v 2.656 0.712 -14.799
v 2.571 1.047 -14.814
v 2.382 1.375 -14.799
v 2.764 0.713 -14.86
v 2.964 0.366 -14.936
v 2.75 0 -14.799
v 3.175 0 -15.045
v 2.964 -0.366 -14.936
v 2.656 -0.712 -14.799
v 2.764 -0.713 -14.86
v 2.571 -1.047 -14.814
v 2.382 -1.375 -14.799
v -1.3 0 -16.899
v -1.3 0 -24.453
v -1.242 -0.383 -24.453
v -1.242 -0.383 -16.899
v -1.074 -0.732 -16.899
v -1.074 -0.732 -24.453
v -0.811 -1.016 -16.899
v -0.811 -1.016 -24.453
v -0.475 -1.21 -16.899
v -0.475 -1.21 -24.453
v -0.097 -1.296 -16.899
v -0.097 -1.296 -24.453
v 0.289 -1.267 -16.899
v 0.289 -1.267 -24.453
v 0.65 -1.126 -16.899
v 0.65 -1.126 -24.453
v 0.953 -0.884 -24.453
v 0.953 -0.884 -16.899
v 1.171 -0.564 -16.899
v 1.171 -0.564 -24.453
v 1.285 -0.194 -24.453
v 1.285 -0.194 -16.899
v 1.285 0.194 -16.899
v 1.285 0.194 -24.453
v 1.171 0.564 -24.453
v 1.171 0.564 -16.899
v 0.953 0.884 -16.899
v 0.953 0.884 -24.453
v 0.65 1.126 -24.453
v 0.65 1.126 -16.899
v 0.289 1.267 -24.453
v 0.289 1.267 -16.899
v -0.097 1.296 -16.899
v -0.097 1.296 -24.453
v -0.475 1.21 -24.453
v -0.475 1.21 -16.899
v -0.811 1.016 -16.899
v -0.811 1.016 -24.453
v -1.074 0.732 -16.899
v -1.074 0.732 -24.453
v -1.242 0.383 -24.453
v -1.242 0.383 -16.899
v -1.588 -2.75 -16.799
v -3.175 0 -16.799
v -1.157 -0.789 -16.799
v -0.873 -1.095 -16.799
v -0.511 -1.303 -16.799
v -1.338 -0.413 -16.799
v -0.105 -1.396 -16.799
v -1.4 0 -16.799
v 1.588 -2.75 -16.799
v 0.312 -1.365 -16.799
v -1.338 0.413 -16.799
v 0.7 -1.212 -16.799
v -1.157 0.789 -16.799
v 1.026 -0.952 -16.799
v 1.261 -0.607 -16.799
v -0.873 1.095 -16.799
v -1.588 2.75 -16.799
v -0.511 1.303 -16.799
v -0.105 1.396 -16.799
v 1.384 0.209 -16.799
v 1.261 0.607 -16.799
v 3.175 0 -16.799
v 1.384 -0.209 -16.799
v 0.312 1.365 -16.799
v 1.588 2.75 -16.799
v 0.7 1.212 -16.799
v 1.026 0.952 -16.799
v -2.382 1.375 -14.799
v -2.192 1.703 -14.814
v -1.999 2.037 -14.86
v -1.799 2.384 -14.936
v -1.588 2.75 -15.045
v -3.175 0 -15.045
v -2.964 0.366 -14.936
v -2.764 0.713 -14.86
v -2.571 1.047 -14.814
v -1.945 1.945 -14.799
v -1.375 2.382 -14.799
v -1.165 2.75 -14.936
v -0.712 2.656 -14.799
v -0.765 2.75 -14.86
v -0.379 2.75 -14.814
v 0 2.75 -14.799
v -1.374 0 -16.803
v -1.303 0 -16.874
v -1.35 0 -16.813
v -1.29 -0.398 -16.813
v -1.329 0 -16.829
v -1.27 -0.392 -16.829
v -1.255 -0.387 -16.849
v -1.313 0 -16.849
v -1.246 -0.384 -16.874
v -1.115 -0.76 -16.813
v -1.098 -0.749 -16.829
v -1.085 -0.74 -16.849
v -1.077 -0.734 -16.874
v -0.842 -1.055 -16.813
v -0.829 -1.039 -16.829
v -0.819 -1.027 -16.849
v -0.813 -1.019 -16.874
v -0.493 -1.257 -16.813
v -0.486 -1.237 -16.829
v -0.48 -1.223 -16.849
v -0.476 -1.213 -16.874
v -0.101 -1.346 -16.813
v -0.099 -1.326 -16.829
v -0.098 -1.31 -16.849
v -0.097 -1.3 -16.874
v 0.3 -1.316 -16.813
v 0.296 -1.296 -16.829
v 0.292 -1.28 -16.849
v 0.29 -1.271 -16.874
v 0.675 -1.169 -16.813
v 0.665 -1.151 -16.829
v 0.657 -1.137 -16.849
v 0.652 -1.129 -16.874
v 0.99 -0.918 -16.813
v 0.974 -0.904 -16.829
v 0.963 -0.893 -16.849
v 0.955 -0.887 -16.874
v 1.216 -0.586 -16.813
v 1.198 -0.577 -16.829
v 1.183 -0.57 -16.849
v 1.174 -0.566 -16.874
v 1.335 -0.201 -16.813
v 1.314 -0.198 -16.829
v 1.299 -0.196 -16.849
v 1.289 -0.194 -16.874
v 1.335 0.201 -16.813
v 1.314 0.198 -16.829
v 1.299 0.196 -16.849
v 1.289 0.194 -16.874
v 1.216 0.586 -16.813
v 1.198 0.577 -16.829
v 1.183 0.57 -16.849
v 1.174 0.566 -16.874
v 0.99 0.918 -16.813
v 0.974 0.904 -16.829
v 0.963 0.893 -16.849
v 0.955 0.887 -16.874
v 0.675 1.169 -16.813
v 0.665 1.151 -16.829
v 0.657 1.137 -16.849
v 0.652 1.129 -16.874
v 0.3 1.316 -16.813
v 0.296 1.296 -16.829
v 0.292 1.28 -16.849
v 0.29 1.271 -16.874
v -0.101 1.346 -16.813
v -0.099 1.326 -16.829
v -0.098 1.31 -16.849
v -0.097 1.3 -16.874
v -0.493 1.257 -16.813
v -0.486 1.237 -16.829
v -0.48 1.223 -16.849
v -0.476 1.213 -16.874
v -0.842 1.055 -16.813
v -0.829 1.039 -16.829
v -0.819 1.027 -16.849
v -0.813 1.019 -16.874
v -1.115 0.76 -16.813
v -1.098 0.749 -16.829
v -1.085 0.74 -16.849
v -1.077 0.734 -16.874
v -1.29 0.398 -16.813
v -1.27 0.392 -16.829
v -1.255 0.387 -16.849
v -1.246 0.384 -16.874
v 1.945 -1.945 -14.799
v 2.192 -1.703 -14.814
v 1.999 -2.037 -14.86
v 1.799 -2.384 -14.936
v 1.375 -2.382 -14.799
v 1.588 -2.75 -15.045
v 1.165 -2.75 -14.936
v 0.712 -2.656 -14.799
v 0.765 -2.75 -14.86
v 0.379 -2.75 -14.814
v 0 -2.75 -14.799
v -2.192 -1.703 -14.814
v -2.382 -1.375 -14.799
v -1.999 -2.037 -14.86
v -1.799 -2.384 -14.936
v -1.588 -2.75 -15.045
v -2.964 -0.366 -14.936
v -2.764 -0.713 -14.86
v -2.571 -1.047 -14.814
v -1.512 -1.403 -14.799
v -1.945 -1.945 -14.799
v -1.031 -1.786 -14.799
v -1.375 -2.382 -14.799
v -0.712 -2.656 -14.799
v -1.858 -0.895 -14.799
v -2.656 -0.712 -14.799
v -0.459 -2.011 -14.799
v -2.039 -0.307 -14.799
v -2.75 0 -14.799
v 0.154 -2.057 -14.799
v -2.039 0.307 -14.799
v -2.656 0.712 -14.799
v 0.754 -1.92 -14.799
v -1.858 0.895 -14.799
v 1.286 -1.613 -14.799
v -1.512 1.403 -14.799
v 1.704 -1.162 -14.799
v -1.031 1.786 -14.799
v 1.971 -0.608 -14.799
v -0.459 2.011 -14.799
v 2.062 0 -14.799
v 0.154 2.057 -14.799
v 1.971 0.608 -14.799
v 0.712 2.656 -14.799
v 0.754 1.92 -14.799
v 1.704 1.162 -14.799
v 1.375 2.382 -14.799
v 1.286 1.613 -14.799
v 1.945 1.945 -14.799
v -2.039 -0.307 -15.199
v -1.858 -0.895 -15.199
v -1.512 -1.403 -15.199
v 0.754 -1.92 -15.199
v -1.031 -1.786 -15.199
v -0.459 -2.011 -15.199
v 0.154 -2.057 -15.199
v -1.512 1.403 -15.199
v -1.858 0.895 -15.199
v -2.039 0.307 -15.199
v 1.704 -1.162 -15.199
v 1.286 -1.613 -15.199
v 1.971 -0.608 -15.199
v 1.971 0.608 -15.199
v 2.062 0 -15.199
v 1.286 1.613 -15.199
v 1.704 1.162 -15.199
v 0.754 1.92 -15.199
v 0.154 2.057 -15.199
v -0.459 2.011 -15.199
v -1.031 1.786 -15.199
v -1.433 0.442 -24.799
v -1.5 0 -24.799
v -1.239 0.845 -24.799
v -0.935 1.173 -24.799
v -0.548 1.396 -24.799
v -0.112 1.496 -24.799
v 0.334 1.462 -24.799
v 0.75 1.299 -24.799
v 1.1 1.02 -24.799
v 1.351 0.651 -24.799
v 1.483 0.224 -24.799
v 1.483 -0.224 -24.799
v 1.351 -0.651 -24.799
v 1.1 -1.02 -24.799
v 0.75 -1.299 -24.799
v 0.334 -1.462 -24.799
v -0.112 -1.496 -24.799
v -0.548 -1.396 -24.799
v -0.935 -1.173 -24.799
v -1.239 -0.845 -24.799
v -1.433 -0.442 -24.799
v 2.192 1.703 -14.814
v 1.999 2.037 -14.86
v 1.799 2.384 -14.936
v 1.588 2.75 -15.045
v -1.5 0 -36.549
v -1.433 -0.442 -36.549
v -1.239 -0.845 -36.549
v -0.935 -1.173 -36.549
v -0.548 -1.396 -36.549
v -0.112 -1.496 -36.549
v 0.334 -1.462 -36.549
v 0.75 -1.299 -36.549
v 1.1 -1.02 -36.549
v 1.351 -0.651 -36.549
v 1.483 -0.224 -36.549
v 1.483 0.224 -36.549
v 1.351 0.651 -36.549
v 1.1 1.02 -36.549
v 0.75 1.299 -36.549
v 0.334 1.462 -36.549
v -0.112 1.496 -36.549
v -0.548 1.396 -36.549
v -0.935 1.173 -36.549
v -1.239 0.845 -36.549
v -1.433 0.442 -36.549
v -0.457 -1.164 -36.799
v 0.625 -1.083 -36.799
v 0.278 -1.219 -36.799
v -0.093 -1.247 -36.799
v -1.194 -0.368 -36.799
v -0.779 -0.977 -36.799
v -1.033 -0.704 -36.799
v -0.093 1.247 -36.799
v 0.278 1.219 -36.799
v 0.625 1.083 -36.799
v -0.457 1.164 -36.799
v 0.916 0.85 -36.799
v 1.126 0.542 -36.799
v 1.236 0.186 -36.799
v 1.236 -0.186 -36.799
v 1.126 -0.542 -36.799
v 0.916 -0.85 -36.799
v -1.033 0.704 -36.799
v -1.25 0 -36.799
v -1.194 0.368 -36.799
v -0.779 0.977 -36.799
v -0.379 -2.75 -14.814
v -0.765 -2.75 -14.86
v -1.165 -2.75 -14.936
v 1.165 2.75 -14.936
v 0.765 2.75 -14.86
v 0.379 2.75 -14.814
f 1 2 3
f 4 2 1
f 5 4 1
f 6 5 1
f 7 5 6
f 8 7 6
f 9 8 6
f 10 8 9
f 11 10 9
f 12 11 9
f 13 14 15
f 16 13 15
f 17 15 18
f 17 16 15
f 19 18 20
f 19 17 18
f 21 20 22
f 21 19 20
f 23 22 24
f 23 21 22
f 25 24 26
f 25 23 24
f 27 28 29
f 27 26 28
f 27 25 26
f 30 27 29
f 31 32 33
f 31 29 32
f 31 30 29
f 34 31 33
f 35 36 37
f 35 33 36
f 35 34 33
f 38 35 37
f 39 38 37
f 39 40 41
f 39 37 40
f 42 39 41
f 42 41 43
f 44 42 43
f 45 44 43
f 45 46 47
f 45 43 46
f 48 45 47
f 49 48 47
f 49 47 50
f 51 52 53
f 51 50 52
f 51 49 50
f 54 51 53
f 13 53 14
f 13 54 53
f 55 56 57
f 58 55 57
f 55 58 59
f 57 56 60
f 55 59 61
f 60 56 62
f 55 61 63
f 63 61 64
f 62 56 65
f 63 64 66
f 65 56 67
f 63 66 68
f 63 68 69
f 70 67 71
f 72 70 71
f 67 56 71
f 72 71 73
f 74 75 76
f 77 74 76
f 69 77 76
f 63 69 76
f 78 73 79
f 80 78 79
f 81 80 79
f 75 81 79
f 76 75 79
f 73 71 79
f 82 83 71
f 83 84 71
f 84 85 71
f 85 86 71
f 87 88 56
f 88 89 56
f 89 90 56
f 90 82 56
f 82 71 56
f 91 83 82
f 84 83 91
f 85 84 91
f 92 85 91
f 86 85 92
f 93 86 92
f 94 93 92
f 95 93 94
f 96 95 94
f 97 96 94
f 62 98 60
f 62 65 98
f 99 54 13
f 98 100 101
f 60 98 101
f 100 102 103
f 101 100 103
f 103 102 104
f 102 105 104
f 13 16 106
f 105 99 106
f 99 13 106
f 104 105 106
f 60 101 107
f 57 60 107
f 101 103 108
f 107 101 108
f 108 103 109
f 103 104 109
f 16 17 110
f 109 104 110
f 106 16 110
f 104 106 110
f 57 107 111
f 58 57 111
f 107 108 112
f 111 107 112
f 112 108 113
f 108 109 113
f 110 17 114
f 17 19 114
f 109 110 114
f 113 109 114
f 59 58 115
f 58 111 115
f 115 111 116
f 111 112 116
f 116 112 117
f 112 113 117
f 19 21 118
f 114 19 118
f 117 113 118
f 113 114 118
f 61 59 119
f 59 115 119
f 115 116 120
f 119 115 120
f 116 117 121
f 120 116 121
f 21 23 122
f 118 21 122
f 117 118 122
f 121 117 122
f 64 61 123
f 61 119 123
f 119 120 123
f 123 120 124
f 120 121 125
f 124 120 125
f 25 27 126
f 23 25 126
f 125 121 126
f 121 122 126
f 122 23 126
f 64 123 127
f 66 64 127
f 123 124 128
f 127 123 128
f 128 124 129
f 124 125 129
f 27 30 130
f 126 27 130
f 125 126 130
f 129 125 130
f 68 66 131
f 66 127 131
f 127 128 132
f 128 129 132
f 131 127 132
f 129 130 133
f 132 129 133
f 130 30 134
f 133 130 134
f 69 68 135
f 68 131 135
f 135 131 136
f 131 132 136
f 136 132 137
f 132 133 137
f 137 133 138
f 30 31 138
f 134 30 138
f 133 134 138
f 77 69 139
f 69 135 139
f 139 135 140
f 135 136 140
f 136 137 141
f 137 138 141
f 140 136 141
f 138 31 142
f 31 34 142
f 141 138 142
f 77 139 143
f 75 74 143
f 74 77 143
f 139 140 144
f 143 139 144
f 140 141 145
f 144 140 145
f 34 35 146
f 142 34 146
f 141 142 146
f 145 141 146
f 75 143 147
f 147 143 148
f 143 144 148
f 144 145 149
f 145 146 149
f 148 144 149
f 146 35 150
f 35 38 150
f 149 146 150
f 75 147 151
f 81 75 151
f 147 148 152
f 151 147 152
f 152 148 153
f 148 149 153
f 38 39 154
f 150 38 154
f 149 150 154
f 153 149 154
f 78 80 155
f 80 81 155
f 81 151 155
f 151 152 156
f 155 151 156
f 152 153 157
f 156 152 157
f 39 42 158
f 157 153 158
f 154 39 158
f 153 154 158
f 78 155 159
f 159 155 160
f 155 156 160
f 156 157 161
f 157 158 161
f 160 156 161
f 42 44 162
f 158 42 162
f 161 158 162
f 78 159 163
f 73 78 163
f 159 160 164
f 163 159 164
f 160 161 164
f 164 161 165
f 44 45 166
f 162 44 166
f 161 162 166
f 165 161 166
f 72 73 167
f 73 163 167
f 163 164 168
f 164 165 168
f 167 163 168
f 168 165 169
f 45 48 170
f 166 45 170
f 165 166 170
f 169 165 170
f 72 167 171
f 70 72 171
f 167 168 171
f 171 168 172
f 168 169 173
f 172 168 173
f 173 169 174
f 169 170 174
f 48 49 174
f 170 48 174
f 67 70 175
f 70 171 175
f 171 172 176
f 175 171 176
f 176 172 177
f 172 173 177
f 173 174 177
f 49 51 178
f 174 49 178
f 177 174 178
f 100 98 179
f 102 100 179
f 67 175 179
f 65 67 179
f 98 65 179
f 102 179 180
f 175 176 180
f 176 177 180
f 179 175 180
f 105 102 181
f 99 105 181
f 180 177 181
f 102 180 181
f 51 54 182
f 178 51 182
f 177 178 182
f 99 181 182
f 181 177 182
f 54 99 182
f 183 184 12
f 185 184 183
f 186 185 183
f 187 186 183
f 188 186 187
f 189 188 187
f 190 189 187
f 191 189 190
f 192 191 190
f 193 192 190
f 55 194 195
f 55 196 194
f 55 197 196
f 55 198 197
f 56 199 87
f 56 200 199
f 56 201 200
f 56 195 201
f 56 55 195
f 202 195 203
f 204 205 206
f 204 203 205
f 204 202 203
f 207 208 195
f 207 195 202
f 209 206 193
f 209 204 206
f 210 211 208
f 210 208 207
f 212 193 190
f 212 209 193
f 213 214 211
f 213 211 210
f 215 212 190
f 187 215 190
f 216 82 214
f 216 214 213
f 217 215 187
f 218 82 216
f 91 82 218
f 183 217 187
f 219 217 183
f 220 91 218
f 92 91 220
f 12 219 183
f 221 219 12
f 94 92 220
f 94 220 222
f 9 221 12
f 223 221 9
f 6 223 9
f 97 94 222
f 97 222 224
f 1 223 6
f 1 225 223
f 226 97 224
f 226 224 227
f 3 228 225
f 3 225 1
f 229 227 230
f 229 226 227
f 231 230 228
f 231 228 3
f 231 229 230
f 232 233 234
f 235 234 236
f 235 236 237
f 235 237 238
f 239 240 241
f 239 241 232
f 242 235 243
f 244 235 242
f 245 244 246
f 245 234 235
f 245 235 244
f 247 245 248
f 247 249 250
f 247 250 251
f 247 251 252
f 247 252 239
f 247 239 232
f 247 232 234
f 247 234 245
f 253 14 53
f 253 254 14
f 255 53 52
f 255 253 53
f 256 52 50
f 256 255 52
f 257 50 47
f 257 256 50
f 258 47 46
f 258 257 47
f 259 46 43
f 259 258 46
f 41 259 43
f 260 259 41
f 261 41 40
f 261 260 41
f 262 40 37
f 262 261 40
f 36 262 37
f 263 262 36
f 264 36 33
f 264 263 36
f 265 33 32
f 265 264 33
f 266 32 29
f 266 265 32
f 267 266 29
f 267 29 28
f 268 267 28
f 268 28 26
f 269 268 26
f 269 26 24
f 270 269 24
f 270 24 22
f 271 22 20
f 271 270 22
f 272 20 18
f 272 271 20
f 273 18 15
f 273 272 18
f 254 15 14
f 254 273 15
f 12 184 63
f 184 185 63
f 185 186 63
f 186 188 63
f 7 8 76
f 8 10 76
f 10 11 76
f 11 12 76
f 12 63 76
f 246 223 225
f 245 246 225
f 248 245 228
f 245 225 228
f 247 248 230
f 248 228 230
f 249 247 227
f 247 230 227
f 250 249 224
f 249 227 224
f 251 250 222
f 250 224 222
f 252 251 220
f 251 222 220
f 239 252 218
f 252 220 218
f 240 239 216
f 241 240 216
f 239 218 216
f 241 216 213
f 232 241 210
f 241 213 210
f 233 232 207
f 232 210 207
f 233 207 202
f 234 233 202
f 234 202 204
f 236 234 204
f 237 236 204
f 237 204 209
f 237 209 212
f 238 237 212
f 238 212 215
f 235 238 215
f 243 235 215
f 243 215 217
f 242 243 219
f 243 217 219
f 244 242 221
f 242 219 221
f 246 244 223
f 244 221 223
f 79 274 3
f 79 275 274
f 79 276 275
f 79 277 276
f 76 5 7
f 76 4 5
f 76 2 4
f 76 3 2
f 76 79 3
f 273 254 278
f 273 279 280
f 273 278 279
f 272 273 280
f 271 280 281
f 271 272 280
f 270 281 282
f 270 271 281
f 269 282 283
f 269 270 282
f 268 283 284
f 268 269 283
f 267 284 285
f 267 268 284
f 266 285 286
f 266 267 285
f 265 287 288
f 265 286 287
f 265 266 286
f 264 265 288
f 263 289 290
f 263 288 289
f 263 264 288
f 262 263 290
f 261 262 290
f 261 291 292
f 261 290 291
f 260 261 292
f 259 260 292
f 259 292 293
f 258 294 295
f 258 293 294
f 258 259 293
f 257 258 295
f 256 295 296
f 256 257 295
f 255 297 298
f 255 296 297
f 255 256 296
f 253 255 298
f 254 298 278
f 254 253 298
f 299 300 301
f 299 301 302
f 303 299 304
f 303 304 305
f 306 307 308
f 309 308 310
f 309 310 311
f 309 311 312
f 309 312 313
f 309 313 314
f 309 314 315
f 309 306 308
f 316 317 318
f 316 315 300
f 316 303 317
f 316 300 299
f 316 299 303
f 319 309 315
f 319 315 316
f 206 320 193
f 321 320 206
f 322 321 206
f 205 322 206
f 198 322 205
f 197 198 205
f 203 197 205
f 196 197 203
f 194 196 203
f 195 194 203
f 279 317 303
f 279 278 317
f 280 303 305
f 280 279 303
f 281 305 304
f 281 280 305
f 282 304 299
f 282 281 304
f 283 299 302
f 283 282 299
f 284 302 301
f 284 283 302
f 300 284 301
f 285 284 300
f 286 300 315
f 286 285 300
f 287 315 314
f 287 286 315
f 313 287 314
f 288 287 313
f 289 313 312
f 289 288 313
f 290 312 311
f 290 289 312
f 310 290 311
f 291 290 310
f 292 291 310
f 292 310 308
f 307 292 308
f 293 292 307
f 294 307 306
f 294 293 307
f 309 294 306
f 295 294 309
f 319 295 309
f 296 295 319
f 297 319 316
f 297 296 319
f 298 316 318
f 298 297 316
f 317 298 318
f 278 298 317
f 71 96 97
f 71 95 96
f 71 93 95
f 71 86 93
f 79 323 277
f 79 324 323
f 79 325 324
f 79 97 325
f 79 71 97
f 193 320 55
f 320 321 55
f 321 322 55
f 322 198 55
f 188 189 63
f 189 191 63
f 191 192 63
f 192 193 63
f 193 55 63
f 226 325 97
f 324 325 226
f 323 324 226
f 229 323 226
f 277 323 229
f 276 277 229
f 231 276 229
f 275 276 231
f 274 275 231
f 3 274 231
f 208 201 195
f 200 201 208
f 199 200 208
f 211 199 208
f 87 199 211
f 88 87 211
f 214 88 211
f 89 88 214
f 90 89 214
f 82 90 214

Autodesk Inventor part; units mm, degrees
ref_plane "YZ Plane" through (0, 0, 0) normal (1, 0, 0) x (0, 1, 0)
sketch "Skizze2" plane through (0, 0, 0) normal (0, 1, 0) x (-1, 0, 0)
  line L0 (0, -16.7994) -> (0, -36.7994)
  line L1 (0, -36.7994) -> (1.25, -36.7994)
  line L2 (1.5, -36.5494) -> (1.5, -24.7994)
  line L3 (1.5, -24.7994) -> (1.3, -24.453)
  line L4 (1.3, -24.453) -> (1.3, -16.7994)
  line L5 (1.3, -16.7994) -> (0, -16.7994)
  line L6 (1.25, -36.7994) -> (1.5, -36.5494)
  line L7 (1.5, -36.7994) -> (1.5, -37.153)
  line L8 (0, -41.2237) -> (0, -12.7287) projected
  dimension "Ds" = 2.6
  dimension "NND" = 3
  dimension "b" = 12
  dimension "d3" = 30
  dimension "d5" = 45
  dimension "PTC" = 0.5
  dimension "NLG" = 20
revolve "Drehung1" add sketch "Skizze2" angle 360 about axis through (0, 0, -16.7994) along (0, 0, -1)
sketch "Skizze3" plane through (0, 0, -16.7994) normal (0, 0, 1) x (1, 0, 0)
  circle A0 centre (0, 0) radius 1.3 projected
  line L0 (0, 2.75) -> (1.5877, 2.75)
  line L1 (1.5877, 2.75) -> (3.1754, 0)
  line L2 (3.1754, 0) -> (0, 0)
  line L3 (0, 0) -> (0, 2.75)
  line L4 (0, 2.75) -> (-1.5877, 2.75)
  line L5 (-1.5877, 2.75) -> (-3.1754, 0)
  line L6 (0, -2.75) -> (1.5877, -2.75)
  line L7 (1.5877, -2.75) -> (3.1754, 0)
  line L8 (-1.5877, -2.75) -> (-3.1754, 0)
  line L9 (0, -2.75) -> (-1.5877, -2.75)
  dimension "d9" = 60
  dimension "ParS" = 5.5
  dimension "msp_d11" = 5.5
extrude "Extrusion1" add sketch "Skizze3" along normal blind 2
sketch "Skizze4" plane through (0, 0, 0) normal (0, 1, 0) x (-1, 0, 0)
  line L0 (-2.75, -14.7994) -> (-3.1754, -14.7994)
  line L1 (-3.1754, -14.7994) -> (-3.1754, -15.045)
  line L2 (-3.1754, -15.045) -> (-2.75, -14.7994)
  line L3 (0, -25.6442) -> (0, 36.2691) projected
  line L4 (0, 27.4244) -> (0, 27.1787)
  line L5 (-3.1754, -16.7994) -> (-3.1754, -14.7994) projected
  line L6 (-1.5877, -14.7994) -> (-3.1754, -14.7994) projected
  dimension "d14" = 30
  dimension "msp_d15" = 5.5
revolve "Drehung2" cut sketch "Skizze4" angle 360 about axis through (0, 0, 27.4244) along (0, 0, -1)
sketch "Sketch5" plane through (0, 0, -14.7994) normal (0, 0, 1) x (1, 0, 0)
  arc A0 (2.3816, 1.375) -> (0, 2.75) centre (0, 0) ccw projected
  circle A1 centre (0, 0) radius 2.0625
  dimension "d27" = 4.125
extrude "Extrusion2" cut sketch "Sketch5" against normal blind 0.4
thread "Gewinde1" size "M3x0.5" class "6g" standard "ISO Metric profile" full length
ref_plane "MSC_PF1" through (0, 0, 0) normal (0, 1, 0) x (-1, 0, 0)
ref_plane "MSC_PT1" through (0, 0, -16.7994) normal (0, 0, -1) x (-1, 0, 0)
fillet "Fillet1" radius 0.1 1 edges at (1.3, 0, -16.7994)
equation "\"msp_d11\" = ParS"
equation "\"d27\" = 0.75 * ParS"
equation "\"d28\" = 0.2 * ParK"
equation "\"d30\" = r"
equation "\"msp_d17\" = b"
equation "\"msp_d15\" = ParS"
equation "\"r\" = 0.1"
equation "\"THREADDIA\" = NND"
equation "\"ParK\" = 2"
properties part number "DIN EN ISO 4015 - M3x20" material "Edelstahl, 440C"
